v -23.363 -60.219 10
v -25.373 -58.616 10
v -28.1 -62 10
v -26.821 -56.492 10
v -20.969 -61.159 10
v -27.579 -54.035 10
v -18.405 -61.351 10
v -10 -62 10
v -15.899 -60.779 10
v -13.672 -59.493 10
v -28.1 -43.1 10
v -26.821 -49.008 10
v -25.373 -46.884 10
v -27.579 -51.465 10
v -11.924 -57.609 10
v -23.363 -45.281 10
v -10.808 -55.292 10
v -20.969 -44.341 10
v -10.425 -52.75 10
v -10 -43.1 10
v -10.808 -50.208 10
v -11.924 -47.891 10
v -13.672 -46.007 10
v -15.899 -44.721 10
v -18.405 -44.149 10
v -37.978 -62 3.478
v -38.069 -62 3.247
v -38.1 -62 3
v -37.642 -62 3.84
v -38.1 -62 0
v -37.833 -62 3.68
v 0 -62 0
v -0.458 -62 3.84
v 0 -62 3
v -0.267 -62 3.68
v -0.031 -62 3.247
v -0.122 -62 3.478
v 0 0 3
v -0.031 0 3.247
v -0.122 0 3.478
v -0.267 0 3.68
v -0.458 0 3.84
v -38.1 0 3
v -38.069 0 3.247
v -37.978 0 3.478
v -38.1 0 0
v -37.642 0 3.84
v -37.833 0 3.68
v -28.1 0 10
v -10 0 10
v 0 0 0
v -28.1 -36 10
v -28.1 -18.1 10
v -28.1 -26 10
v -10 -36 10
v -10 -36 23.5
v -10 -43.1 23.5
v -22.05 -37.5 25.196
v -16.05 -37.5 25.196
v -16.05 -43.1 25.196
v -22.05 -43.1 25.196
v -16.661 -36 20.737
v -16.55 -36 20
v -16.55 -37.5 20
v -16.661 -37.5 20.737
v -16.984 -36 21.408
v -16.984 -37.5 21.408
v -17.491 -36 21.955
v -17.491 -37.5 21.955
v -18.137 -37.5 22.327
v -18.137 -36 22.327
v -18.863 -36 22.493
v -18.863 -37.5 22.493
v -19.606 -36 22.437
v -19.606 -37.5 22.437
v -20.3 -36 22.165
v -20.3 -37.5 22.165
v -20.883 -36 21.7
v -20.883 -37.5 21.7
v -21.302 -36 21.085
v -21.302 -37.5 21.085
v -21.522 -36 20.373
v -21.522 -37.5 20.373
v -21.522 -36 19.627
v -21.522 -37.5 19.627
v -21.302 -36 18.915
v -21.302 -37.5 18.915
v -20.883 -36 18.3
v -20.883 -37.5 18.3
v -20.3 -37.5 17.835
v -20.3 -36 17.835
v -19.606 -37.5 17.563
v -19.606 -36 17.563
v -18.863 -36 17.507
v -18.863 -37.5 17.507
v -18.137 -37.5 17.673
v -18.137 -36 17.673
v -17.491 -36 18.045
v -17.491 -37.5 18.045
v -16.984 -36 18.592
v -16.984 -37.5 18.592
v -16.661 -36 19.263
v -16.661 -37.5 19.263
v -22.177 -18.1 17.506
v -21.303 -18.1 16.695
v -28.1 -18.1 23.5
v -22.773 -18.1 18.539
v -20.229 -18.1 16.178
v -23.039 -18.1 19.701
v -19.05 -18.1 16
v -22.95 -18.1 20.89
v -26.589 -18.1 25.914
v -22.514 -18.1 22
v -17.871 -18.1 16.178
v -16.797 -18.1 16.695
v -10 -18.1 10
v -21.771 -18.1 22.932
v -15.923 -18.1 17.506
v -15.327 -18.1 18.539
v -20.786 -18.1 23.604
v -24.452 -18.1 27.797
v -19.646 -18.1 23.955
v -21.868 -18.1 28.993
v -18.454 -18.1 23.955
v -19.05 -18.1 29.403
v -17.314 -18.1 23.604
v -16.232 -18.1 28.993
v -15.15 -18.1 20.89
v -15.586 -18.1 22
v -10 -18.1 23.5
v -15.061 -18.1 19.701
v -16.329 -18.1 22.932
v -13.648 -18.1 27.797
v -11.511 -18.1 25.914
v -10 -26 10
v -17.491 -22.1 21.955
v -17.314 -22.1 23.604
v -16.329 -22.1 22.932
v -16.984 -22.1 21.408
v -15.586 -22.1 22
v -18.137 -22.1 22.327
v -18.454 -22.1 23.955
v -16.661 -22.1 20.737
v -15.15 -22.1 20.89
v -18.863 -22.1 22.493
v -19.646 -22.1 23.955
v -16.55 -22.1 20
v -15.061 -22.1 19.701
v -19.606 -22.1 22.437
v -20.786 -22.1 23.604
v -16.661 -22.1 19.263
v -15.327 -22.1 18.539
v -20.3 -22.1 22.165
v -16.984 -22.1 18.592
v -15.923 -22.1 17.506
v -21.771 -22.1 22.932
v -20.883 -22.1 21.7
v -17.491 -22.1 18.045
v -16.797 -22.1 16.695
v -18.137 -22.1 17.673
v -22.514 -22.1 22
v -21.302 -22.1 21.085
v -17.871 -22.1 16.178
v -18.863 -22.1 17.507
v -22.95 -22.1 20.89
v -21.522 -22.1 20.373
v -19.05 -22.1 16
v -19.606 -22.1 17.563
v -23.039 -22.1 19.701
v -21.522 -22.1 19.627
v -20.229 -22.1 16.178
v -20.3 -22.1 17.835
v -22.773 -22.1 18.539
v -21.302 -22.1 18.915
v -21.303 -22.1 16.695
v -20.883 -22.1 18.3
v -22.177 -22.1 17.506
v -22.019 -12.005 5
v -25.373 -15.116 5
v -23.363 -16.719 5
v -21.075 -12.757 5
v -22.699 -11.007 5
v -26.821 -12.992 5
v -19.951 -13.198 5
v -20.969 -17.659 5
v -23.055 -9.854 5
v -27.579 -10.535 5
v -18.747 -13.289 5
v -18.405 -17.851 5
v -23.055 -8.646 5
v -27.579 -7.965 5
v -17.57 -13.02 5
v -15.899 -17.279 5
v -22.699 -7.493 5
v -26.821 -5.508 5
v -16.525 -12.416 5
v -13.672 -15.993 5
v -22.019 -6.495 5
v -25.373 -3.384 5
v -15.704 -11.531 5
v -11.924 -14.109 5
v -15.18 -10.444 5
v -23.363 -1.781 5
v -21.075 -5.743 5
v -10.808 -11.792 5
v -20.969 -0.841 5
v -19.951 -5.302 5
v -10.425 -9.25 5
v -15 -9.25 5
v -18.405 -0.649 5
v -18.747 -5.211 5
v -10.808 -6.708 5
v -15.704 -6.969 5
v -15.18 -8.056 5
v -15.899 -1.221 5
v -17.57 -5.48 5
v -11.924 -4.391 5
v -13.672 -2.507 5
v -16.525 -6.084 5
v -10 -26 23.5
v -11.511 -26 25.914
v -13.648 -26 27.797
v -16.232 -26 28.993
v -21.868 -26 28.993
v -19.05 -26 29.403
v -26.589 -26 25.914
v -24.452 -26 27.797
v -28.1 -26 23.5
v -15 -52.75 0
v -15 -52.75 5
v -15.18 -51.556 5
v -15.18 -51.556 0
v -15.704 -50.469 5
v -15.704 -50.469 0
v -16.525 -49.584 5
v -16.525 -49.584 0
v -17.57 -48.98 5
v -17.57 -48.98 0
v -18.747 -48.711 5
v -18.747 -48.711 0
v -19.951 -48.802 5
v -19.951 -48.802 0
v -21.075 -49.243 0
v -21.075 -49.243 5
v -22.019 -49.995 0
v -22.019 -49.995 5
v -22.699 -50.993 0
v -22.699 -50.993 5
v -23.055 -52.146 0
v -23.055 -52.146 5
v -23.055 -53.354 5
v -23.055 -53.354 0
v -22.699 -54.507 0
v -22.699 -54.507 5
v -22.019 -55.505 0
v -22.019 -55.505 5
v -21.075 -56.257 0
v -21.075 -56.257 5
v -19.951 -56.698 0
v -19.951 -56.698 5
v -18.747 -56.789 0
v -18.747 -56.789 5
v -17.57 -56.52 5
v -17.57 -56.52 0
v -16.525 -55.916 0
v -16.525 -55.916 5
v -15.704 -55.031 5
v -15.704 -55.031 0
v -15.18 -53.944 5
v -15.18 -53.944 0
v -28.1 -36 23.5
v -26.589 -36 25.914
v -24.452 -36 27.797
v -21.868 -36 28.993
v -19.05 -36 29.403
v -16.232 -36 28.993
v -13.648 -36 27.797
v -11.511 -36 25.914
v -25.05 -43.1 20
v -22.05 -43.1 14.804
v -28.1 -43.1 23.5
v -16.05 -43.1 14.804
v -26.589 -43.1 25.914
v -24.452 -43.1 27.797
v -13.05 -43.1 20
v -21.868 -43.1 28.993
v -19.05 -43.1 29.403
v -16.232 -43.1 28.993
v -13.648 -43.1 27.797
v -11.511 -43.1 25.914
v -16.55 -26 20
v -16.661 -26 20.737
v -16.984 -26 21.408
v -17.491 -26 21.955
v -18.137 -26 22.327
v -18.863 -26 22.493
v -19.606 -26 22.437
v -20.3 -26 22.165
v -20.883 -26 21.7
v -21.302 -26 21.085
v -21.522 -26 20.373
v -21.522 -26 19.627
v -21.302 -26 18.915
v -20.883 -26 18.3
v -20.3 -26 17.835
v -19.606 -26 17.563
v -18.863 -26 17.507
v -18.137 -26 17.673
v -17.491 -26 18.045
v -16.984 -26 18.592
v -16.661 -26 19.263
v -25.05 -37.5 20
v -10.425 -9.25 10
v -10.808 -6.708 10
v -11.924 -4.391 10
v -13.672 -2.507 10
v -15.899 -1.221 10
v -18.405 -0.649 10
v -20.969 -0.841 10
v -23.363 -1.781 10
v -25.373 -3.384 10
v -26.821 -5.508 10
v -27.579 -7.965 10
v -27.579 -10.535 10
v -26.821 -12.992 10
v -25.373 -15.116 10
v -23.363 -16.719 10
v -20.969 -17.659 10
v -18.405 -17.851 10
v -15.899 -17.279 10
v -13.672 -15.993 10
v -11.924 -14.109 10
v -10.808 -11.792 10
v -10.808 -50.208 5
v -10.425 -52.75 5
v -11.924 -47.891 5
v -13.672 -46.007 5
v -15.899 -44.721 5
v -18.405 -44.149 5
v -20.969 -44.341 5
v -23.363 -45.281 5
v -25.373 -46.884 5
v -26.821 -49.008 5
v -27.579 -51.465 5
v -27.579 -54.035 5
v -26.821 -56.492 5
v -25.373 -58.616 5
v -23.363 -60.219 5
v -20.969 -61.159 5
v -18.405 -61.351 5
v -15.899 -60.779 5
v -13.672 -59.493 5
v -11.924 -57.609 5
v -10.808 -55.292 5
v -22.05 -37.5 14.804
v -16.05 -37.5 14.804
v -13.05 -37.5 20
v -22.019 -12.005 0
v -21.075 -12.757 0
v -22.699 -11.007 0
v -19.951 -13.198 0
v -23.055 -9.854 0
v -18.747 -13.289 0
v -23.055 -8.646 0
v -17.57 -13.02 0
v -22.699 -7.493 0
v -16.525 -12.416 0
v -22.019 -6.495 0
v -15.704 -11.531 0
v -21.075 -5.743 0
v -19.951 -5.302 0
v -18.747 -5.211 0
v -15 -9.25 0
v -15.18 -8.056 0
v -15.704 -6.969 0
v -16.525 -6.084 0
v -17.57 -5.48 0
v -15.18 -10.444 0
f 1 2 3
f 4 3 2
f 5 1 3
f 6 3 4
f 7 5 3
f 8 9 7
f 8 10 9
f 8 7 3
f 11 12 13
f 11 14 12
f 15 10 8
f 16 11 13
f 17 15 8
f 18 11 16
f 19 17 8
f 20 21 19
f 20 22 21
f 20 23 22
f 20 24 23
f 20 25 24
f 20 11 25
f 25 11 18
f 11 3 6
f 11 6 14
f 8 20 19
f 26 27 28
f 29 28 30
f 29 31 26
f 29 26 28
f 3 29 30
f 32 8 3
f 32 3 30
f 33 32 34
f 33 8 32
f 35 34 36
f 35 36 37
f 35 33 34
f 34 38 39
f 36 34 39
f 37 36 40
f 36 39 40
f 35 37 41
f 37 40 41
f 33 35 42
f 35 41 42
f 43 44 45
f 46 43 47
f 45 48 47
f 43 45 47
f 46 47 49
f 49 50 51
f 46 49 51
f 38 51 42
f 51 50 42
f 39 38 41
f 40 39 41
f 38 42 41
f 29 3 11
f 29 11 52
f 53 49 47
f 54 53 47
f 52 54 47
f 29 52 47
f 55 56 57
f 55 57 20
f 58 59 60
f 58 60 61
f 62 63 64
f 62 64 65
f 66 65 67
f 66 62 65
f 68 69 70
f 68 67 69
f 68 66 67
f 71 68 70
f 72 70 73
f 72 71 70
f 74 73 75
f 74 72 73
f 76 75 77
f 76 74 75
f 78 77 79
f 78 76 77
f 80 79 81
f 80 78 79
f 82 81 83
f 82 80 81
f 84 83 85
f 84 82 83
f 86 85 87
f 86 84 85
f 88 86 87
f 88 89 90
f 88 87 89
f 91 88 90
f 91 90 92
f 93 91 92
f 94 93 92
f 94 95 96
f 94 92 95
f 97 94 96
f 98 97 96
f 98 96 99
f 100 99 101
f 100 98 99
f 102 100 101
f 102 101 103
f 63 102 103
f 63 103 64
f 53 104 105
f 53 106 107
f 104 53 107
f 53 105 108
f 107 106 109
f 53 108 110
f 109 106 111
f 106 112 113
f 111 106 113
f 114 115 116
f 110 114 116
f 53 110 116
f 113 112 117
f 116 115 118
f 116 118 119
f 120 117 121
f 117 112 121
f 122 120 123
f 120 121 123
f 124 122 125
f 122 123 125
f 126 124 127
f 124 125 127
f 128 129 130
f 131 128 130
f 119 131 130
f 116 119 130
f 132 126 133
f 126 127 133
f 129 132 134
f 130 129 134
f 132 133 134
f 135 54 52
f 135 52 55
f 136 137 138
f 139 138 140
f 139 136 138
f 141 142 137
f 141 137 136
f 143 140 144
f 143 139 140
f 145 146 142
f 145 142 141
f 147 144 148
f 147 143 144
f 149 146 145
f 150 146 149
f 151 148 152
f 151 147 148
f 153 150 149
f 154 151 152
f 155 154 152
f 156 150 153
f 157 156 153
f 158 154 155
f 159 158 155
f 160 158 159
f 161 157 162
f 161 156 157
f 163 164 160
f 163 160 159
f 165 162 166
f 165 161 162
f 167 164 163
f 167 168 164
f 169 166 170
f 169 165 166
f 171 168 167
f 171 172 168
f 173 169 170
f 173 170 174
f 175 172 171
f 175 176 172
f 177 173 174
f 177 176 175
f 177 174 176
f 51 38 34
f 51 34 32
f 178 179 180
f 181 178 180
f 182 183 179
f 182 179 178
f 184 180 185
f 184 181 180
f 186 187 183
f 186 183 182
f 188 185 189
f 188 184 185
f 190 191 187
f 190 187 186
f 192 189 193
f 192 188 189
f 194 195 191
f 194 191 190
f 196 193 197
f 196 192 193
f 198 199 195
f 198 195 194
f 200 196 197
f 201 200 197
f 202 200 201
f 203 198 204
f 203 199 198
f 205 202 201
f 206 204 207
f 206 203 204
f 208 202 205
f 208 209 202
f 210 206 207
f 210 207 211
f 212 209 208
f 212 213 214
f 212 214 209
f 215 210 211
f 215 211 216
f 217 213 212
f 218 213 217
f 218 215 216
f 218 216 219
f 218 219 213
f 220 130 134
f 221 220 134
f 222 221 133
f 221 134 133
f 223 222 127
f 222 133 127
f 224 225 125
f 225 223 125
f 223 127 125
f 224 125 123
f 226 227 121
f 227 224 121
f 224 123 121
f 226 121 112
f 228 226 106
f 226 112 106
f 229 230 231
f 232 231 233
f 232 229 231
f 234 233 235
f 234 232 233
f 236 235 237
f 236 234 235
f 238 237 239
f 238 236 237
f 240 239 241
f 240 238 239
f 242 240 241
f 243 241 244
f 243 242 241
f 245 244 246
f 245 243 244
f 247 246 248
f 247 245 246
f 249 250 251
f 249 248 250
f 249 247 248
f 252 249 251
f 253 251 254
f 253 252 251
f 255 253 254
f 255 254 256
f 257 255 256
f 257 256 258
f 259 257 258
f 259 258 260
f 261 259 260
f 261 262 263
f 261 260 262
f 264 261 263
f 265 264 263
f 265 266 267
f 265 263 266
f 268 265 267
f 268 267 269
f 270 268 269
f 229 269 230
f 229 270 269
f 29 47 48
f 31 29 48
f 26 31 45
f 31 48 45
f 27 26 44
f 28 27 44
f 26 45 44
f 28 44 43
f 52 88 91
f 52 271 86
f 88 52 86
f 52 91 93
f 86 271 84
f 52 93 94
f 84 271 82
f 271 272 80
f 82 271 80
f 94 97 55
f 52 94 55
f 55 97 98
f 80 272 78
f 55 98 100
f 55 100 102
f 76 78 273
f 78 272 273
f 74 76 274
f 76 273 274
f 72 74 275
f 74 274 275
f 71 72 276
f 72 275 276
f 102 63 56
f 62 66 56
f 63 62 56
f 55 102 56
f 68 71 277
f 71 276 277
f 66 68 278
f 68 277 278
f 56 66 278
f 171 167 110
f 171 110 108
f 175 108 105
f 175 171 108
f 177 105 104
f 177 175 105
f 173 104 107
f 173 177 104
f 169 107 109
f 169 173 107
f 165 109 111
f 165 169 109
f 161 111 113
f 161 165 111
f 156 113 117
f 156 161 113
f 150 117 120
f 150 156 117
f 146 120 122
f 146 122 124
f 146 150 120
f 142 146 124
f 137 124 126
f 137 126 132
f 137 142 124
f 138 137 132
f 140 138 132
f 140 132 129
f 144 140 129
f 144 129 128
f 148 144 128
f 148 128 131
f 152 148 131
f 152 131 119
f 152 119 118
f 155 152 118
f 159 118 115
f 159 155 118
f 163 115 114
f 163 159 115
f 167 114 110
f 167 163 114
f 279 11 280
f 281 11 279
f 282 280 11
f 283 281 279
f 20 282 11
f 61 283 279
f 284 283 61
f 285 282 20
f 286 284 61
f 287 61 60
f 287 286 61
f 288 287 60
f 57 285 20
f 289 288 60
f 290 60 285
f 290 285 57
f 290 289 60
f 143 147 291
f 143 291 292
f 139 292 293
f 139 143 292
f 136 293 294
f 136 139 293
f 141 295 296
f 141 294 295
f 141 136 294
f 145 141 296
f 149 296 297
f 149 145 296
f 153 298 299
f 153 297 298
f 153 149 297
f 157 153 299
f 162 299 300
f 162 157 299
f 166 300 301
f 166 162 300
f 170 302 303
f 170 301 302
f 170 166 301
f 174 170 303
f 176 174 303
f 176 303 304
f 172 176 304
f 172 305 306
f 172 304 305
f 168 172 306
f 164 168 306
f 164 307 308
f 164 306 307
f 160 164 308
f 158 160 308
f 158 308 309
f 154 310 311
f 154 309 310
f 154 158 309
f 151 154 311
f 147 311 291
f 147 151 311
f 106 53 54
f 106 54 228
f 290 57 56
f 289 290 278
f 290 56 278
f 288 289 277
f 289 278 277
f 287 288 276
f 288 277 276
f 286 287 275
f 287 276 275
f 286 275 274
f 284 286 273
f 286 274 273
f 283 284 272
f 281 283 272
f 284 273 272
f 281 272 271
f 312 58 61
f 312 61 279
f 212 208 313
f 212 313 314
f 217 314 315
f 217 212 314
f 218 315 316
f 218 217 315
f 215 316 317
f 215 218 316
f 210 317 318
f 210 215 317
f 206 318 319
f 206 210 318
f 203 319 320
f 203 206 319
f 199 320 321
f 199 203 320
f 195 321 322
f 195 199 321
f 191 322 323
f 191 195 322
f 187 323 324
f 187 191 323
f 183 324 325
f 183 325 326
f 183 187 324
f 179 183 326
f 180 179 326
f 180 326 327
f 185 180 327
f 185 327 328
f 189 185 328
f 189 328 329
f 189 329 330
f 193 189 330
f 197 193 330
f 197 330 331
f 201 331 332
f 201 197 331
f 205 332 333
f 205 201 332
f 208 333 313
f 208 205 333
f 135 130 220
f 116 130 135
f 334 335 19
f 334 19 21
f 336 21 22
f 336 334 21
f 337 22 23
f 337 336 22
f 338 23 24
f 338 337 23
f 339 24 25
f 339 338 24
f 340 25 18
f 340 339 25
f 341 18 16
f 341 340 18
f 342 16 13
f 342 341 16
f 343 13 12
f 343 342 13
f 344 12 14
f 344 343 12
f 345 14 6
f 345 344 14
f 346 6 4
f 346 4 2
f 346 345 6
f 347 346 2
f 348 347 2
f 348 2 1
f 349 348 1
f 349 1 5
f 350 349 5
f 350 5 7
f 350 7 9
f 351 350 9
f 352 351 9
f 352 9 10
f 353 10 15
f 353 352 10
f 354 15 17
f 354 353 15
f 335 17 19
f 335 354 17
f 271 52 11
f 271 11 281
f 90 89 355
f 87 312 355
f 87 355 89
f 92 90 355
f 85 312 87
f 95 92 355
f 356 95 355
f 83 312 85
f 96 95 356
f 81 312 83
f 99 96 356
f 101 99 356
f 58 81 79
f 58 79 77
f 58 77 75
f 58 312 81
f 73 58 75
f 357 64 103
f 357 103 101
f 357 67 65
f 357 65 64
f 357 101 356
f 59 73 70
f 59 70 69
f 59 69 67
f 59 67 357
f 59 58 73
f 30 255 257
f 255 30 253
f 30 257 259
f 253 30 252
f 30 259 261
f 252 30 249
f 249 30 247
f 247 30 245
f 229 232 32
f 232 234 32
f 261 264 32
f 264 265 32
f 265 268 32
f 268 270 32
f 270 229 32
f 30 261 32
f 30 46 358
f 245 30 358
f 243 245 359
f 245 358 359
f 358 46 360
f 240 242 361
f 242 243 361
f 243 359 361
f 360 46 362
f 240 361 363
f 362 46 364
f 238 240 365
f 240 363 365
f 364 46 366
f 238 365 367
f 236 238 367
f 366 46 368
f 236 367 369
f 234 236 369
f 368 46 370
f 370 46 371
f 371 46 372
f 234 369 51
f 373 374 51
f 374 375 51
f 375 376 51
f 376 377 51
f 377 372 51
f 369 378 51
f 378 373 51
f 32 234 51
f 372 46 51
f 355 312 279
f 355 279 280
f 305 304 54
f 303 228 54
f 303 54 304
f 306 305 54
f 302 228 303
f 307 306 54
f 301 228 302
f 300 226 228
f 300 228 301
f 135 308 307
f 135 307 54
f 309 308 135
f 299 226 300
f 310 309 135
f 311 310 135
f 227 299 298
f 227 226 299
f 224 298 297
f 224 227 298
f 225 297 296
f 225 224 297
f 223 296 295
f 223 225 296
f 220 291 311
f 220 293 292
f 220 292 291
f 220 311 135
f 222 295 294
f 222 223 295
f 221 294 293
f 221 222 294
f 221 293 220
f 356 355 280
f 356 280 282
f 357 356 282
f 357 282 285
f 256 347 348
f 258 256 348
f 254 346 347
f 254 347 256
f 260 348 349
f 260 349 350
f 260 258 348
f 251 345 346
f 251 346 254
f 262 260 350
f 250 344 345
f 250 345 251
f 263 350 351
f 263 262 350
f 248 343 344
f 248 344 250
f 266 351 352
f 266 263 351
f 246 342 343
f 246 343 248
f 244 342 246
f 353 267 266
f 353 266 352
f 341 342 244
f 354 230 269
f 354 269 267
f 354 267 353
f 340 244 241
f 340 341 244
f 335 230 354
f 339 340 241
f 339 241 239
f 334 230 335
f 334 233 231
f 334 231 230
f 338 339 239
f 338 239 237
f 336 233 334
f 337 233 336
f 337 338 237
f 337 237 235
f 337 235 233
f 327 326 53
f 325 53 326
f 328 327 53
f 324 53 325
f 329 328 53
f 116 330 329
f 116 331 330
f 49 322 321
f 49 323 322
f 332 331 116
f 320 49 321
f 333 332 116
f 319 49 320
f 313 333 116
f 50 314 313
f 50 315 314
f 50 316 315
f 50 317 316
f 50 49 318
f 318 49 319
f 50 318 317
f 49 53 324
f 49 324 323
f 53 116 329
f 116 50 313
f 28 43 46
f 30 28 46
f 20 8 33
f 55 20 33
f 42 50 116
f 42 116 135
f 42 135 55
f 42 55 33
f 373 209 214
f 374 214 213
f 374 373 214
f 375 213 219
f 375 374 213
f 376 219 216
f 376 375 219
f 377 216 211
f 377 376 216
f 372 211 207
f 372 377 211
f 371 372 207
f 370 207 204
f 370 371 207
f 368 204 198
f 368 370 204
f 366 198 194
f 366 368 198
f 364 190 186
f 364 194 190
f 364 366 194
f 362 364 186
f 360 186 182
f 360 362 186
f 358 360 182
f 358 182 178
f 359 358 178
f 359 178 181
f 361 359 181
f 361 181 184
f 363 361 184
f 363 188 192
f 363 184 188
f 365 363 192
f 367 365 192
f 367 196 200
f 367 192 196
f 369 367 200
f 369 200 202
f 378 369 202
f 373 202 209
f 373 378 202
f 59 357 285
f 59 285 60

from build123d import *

# Parameters (mm, degrees)
PAD_DEPTH         = 62
SKETCH003_R       = 4.05
POCKET_DEPTH      = 0.001
POCKET_DEPTH_BACK = -10.001
SKETCH_R          = 8.625
POCKET001_DEPTH   = 5
PAD001_DEPTH      = 25
BOX_W             = 20
BOX_H             = 20
BOX_DEPTH         = 10
SKETCH005_R       = 2.5
POCKET002_DEPTH   = 62.001
CYLINDER_R        = 4
CYLINDER_DEPTH    = 4
POCKET003_DEPTH   = 6


with BuildPart() as part:
    # Sketch002 (on Sketch) → Pad (new body)
    with BuildSketch(Plane.XZ):
        with BuildLine():
            Line((-38.1, 3), (-38.1, 0))
            Line((-38.1, 0), (0, 0))
            Line((0, 3), (0, 0))
            ThreePointArc((0, 3), (-0.121836, 3.47836), (-0.457656, 3.840157))
            Line((-10, 10), (-0.457656, 3.840157))
            Line((-28.1, 10), (-10, 10))
            Line((-28.1, 10), (-37.642344, 3.840157))
            ThreePointArc((-37.642344, 3.840157), (-37.978164, 3.47836), (-38.1, 3))
        make_face()
    extrude(amount=PAD_DEPTH)

    # Sketch003 → Pocket (cut, two sides)
    with BuildSketch(Plane.XY) as pocket_sk:
        with Locations((-19.05, -9.25)):
            Circle(SKETCH003_R)
        with Locations((-19.05, -52.75)):
            Circle(SKETCH003_R)
    extrude(amount=-POCKET_DEPTH, mode=Mode.SUBTRACT)
    extrude(pocket_sk.sketch, amount=-POCKET_DEPTH_BACK, mode=Mode.SUBTRACT)

    # Sketch → Pocket001 (cut)
    with BuildSketch(Plane.XY.offset(5)):
        with Locations((-19.05, -9.25)):
            Circle(SKETCH_R)
        with Locations((-19.05, -52.75)):
            Circle(SKETCH_R)
    extrude(amount=POCKET001_DEPTH, mode=Mode.SUBTRACT)

    # Sketch004 → Pad001 (join)
    with BuildSketch(Plane.XZ.offset(18.1)):
        with BuildLine():
            Line((-28.1, 10), (-10, 10))
            Line((-10, 23.5), (-10, 10))
            ThreePointArc((-10, 23.5), (-19.05, 29.402761), (-28.1, 23.5))
            Line((-28.1, 10), (-28.1, 23.5))
        make_face()
    extrude(amount=PAD001_DEPTH)

    # Box → Box (cut)
    with BuildSketch(Plane(origin=(-29, -26, 10), x_dir=(1, 0, 0), z_dir=(0, -1, 0))):
        with Locations((10, 10)):
            Rectangle(BOX_W, BOX_H)
    extrude(amount=BOX_DEPTH, mode=Mode.SUBTRACT)

    # Sketch005 → Pocket002 (cut, through all)
    with BuildSketch(Plane.XZ):
        with Locations((-19.05, 20)):
            Circle(SKETCH005_R)
    extrude(amount=POCKET002_DEPTH, mode=Mode.SUBTRACT)

    # Cylinder → Cylinder (cut)
    with BuildSketch(Plane(origin=(-19.05, -22.1, 20), x_dir=(0, 0, -1), z_dir=(0, 1, 0))):
        Circle(CYLINDER_R)
    extrude(amount=CYLINDER_DEPTH, mode=Mode.SUBTRACT)

    # Sketch006 → Pocket003 (cut)
    with BuildSketch(Plane.XZ.offset(37.5)):
        Polygon((-16.05, 25.196152), (-22.05, 25.196152), (-25.05, 20), (-22.05, 14.803848), (-16.05, 14.803848), (-13.05, 20), align=None)
    extrude(amount=POCKET003_DEPTH, mode=Mode.SUBTRACT)


solid = part.part
